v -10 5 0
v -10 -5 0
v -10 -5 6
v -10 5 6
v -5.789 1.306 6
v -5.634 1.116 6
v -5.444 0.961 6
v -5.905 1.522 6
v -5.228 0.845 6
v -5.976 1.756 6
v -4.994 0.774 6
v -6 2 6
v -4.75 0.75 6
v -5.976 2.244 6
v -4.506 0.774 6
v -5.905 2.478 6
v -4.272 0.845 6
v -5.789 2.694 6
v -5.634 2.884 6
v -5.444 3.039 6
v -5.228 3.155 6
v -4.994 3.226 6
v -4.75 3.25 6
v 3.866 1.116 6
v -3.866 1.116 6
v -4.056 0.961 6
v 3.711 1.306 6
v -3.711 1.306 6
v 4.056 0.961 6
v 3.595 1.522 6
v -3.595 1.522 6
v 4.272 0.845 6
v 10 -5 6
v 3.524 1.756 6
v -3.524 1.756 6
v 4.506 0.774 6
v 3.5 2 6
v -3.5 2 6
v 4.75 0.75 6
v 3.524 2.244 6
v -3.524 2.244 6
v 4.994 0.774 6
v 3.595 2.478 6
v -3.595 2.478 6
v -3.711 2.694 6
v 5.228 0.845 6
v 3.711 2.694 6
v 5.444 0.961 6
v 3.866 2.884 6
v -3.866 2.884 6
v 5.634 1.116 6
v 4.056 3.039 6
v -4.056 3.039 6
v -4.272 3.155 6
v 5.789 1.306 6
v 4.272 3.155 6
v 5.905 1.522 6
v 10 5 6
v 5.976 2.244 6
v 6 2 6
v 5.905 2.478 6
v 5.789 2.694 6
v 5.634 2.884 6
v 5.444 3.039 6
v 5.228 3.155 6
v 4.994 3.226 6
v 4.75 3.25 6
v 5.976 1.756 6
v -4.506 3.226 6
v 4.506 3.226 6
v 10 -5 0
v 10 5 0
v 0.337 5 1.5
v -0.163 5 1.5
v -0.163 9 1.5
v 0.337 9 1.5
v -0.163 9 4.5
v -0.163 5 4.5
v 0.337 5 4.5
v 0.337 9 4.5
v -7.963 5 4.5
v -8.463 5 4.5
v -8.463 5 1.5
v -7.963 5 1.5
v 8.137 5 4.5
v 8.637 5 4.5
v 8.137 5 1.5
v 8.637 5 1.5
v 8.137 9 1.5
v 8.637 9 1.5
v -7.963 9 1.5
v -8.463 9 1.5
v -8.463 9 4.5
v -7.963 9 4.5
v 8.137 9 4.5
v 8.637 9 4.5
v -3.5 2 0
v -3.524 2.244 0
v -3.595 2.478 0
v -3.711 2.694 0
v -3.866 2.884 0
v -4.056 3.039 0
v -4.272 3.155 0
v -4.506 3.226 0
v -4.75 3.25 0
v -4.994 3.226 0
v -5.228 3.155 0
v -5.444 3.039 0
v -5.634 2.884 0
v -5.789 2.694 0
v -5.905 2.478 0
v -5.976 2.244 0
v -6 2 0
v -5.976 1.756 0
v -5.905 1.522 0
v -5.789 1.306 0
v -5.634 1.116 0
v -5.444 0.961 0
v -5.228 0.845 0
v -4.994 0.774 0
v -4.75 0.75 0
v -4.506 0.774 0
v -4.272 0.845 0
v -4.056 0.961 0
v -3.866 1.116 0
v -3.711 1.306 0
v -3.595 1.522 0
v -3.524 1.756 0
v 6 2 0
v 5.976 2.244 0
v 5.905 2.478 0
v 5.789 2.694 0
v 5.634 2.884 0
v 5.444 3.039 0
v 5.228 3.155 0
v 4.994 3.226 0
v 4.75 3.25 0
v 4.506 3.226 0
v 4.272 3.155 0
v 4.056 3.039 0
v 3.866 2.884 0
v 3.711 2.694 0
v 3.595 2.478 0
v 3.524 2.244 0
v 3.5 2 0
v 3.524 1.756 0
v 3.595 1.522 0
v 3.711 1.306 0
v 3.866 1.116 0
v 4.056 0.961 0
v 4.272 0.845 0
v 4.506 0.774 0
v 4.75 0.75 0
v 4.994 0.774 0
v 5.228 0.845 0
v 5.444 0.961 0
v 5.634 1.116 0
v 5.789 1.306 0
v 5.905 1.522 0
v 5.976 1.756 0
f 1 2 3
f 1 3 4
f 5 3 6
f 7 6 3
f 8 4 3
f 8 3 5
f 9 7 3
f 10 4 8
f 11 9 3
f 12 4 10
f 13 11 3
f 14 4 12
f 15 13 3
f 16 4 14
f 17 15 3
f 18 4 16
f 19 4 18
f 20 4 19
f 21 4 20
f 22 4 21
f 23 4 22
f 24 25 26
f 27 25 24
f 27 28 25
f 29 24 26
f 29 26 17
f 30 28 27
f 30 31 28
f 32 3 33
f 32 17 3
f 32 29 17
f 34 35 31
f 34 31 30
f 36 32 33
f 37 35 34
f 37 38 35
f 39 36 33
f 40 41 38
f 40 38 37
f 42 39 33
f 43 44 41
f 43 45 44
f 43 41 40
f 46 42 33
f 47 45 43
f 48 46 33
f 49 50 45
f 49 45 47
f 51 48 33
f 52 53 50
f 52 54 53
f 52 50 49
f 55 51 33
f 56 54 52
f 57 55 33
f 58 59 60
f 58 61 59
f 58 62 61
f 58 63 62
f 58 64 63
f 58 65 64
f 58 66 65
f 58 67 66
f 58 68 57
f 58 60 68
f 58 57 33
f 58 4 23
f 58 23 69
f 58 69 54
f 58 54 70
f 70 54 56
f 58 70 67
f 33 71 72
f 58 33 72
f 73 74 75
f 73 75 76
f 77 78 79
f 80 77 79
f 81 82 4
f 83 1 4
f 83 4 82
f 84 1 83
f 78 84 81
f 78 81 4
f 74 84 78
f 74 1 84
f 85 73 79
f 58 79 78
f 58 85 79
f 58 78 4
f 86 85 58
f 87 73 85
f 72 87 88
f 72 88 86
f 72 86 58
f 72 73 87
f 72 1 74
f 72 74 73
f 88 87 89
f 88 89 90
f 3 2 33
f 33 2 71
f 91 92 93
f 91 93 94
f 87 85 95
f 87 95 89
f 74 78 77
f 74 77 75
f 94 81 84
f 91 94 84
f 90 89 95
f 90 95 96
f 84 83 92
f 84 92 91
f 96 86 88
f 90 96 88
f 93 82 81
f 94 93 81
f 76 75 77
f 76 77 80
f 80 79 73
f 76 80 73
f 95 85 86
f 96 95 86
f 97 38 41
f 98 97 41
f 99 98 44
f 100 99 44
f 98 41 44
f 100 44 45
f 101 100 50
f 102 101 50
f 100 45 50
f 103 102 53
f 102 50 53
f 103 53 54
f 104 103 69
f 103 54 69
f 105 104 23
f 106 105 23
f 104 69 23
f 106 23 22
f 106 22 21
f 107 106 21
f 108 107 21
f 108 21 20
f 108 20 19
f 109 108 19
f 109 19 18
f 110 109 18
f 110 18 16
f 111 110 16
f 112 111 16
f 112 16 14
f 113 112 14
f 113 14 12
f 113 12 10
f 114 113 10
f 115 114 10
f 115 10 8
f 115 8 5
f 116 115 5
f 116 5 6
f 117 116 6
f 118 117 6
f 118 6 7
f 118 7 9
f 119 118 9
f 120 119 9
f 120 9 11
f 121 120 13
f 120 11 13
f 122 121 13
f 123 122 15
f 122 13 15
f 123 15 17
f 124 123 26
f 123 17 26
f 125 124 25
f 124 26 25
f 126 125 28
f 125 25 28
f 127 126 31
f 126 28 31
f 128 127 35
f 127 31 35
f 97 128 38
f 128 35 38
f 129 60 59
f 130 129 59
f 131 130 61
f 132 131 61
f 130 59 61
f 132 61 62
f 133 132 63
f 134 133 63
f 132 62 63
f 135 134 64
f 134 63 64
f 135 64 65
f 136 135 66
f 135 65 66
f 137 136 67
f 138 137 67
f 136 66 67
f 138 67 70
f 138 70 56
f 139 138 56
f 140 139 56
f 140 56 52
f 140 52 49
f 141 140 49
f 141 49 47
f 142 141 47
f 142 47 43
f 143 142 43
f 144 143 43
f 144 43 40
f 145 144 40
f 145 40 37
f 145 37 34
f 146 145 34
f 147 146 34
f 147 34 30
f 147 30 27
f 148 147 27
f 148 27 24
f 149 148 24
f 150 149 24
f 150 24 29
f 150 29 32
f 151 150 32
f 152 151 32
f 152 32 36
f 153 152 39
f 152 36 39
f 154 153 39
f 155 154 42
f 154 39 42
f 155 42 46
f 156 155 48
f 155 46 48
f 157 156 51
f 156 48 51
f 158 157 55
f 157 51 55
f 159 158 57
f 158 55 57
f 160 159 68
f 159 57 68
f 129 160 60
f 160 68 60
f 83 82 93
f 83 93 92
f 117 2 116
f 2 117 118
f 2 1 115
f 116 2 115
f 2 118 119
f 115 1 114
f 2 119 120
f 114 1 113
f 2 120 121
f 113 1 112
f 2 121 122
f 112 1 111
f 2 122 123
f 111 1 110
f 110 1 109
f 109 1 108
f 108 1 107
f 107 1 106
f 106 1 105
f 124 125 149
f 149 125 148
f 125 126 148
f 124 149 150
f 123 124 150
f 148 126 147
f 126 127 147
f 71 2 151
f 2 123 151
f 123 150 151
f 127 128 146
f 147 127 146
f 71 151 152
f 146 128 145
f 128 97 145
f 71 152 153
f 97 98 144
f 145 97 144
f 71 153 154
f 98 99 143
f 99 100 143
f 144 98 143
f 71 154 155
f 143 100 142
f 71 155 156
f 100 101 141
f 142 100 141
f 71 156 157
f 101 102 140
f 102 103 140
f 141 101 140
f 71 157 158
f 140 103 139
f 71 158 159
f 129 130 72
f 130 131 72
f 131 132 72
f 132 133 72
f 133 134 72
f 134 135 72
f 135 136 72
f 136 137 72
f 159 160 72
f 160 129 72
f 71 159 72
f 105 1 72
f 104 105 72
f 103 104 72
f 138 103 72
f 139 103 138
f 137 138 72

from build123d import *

# Parameters (mm, degrees)
SKETCH1_W           = 20
SKETCH1_H           = 10
BOSS_EXTRUDE1_DEPTH = 6
SKETCH2_W           = 0.5
SKETCH2_H           = 3
BOSS_EXTRUDE2_DEPTH = 4
SKETCH3_R           = 1.25
CUT_EXTRUDE1_DEPTH  = 15.730919863


with BuildPart() as part:
    # Sketch1 → Boss-Extrude1 (new body)
    with BuildSketch(Plane.XY):
        Rectangle(SKETCH1_W, SKETCH1_H)
    extrude(amount=BOSS_EXTRUDE1_DEPTH)

    # Sketch2 → Boss-Extrude2 (add)
    with BuildSketch(Plane(origin=(0, 5, 0), x_dir=(1, 0, 0), z_dir=(0, 1, 0))):
        with Locations((-8.212529155, -3)):
            Rectangle(SKETCH2_W, SKETCH2_H)
        with Locations((0.087470845, -3)):
            Rectangle(SKETCH2_W, SKETCH2_H)
        with Locations((8.387470845, -3)):
            Rectangle(SKETCH2_W, SKETCH2_H)
    extrude(amount=BOSS_EXTRUDE2_DEPTH)

    # Sketch3 → Cut-Extrude1 (cut, through all)
    with BuildSketch(Plane.XY.offset(6)):
        with Locations((-4.75, 2)):
            Circle(SKETCH3_R)
        with Locations((4.75, 2)):
            Circle(SKETCH3_R)
    extrude(amount=-CUT_EXTRUDE1_DEPTH, mode=Mode.SUBTRACT)


solid = part.part
